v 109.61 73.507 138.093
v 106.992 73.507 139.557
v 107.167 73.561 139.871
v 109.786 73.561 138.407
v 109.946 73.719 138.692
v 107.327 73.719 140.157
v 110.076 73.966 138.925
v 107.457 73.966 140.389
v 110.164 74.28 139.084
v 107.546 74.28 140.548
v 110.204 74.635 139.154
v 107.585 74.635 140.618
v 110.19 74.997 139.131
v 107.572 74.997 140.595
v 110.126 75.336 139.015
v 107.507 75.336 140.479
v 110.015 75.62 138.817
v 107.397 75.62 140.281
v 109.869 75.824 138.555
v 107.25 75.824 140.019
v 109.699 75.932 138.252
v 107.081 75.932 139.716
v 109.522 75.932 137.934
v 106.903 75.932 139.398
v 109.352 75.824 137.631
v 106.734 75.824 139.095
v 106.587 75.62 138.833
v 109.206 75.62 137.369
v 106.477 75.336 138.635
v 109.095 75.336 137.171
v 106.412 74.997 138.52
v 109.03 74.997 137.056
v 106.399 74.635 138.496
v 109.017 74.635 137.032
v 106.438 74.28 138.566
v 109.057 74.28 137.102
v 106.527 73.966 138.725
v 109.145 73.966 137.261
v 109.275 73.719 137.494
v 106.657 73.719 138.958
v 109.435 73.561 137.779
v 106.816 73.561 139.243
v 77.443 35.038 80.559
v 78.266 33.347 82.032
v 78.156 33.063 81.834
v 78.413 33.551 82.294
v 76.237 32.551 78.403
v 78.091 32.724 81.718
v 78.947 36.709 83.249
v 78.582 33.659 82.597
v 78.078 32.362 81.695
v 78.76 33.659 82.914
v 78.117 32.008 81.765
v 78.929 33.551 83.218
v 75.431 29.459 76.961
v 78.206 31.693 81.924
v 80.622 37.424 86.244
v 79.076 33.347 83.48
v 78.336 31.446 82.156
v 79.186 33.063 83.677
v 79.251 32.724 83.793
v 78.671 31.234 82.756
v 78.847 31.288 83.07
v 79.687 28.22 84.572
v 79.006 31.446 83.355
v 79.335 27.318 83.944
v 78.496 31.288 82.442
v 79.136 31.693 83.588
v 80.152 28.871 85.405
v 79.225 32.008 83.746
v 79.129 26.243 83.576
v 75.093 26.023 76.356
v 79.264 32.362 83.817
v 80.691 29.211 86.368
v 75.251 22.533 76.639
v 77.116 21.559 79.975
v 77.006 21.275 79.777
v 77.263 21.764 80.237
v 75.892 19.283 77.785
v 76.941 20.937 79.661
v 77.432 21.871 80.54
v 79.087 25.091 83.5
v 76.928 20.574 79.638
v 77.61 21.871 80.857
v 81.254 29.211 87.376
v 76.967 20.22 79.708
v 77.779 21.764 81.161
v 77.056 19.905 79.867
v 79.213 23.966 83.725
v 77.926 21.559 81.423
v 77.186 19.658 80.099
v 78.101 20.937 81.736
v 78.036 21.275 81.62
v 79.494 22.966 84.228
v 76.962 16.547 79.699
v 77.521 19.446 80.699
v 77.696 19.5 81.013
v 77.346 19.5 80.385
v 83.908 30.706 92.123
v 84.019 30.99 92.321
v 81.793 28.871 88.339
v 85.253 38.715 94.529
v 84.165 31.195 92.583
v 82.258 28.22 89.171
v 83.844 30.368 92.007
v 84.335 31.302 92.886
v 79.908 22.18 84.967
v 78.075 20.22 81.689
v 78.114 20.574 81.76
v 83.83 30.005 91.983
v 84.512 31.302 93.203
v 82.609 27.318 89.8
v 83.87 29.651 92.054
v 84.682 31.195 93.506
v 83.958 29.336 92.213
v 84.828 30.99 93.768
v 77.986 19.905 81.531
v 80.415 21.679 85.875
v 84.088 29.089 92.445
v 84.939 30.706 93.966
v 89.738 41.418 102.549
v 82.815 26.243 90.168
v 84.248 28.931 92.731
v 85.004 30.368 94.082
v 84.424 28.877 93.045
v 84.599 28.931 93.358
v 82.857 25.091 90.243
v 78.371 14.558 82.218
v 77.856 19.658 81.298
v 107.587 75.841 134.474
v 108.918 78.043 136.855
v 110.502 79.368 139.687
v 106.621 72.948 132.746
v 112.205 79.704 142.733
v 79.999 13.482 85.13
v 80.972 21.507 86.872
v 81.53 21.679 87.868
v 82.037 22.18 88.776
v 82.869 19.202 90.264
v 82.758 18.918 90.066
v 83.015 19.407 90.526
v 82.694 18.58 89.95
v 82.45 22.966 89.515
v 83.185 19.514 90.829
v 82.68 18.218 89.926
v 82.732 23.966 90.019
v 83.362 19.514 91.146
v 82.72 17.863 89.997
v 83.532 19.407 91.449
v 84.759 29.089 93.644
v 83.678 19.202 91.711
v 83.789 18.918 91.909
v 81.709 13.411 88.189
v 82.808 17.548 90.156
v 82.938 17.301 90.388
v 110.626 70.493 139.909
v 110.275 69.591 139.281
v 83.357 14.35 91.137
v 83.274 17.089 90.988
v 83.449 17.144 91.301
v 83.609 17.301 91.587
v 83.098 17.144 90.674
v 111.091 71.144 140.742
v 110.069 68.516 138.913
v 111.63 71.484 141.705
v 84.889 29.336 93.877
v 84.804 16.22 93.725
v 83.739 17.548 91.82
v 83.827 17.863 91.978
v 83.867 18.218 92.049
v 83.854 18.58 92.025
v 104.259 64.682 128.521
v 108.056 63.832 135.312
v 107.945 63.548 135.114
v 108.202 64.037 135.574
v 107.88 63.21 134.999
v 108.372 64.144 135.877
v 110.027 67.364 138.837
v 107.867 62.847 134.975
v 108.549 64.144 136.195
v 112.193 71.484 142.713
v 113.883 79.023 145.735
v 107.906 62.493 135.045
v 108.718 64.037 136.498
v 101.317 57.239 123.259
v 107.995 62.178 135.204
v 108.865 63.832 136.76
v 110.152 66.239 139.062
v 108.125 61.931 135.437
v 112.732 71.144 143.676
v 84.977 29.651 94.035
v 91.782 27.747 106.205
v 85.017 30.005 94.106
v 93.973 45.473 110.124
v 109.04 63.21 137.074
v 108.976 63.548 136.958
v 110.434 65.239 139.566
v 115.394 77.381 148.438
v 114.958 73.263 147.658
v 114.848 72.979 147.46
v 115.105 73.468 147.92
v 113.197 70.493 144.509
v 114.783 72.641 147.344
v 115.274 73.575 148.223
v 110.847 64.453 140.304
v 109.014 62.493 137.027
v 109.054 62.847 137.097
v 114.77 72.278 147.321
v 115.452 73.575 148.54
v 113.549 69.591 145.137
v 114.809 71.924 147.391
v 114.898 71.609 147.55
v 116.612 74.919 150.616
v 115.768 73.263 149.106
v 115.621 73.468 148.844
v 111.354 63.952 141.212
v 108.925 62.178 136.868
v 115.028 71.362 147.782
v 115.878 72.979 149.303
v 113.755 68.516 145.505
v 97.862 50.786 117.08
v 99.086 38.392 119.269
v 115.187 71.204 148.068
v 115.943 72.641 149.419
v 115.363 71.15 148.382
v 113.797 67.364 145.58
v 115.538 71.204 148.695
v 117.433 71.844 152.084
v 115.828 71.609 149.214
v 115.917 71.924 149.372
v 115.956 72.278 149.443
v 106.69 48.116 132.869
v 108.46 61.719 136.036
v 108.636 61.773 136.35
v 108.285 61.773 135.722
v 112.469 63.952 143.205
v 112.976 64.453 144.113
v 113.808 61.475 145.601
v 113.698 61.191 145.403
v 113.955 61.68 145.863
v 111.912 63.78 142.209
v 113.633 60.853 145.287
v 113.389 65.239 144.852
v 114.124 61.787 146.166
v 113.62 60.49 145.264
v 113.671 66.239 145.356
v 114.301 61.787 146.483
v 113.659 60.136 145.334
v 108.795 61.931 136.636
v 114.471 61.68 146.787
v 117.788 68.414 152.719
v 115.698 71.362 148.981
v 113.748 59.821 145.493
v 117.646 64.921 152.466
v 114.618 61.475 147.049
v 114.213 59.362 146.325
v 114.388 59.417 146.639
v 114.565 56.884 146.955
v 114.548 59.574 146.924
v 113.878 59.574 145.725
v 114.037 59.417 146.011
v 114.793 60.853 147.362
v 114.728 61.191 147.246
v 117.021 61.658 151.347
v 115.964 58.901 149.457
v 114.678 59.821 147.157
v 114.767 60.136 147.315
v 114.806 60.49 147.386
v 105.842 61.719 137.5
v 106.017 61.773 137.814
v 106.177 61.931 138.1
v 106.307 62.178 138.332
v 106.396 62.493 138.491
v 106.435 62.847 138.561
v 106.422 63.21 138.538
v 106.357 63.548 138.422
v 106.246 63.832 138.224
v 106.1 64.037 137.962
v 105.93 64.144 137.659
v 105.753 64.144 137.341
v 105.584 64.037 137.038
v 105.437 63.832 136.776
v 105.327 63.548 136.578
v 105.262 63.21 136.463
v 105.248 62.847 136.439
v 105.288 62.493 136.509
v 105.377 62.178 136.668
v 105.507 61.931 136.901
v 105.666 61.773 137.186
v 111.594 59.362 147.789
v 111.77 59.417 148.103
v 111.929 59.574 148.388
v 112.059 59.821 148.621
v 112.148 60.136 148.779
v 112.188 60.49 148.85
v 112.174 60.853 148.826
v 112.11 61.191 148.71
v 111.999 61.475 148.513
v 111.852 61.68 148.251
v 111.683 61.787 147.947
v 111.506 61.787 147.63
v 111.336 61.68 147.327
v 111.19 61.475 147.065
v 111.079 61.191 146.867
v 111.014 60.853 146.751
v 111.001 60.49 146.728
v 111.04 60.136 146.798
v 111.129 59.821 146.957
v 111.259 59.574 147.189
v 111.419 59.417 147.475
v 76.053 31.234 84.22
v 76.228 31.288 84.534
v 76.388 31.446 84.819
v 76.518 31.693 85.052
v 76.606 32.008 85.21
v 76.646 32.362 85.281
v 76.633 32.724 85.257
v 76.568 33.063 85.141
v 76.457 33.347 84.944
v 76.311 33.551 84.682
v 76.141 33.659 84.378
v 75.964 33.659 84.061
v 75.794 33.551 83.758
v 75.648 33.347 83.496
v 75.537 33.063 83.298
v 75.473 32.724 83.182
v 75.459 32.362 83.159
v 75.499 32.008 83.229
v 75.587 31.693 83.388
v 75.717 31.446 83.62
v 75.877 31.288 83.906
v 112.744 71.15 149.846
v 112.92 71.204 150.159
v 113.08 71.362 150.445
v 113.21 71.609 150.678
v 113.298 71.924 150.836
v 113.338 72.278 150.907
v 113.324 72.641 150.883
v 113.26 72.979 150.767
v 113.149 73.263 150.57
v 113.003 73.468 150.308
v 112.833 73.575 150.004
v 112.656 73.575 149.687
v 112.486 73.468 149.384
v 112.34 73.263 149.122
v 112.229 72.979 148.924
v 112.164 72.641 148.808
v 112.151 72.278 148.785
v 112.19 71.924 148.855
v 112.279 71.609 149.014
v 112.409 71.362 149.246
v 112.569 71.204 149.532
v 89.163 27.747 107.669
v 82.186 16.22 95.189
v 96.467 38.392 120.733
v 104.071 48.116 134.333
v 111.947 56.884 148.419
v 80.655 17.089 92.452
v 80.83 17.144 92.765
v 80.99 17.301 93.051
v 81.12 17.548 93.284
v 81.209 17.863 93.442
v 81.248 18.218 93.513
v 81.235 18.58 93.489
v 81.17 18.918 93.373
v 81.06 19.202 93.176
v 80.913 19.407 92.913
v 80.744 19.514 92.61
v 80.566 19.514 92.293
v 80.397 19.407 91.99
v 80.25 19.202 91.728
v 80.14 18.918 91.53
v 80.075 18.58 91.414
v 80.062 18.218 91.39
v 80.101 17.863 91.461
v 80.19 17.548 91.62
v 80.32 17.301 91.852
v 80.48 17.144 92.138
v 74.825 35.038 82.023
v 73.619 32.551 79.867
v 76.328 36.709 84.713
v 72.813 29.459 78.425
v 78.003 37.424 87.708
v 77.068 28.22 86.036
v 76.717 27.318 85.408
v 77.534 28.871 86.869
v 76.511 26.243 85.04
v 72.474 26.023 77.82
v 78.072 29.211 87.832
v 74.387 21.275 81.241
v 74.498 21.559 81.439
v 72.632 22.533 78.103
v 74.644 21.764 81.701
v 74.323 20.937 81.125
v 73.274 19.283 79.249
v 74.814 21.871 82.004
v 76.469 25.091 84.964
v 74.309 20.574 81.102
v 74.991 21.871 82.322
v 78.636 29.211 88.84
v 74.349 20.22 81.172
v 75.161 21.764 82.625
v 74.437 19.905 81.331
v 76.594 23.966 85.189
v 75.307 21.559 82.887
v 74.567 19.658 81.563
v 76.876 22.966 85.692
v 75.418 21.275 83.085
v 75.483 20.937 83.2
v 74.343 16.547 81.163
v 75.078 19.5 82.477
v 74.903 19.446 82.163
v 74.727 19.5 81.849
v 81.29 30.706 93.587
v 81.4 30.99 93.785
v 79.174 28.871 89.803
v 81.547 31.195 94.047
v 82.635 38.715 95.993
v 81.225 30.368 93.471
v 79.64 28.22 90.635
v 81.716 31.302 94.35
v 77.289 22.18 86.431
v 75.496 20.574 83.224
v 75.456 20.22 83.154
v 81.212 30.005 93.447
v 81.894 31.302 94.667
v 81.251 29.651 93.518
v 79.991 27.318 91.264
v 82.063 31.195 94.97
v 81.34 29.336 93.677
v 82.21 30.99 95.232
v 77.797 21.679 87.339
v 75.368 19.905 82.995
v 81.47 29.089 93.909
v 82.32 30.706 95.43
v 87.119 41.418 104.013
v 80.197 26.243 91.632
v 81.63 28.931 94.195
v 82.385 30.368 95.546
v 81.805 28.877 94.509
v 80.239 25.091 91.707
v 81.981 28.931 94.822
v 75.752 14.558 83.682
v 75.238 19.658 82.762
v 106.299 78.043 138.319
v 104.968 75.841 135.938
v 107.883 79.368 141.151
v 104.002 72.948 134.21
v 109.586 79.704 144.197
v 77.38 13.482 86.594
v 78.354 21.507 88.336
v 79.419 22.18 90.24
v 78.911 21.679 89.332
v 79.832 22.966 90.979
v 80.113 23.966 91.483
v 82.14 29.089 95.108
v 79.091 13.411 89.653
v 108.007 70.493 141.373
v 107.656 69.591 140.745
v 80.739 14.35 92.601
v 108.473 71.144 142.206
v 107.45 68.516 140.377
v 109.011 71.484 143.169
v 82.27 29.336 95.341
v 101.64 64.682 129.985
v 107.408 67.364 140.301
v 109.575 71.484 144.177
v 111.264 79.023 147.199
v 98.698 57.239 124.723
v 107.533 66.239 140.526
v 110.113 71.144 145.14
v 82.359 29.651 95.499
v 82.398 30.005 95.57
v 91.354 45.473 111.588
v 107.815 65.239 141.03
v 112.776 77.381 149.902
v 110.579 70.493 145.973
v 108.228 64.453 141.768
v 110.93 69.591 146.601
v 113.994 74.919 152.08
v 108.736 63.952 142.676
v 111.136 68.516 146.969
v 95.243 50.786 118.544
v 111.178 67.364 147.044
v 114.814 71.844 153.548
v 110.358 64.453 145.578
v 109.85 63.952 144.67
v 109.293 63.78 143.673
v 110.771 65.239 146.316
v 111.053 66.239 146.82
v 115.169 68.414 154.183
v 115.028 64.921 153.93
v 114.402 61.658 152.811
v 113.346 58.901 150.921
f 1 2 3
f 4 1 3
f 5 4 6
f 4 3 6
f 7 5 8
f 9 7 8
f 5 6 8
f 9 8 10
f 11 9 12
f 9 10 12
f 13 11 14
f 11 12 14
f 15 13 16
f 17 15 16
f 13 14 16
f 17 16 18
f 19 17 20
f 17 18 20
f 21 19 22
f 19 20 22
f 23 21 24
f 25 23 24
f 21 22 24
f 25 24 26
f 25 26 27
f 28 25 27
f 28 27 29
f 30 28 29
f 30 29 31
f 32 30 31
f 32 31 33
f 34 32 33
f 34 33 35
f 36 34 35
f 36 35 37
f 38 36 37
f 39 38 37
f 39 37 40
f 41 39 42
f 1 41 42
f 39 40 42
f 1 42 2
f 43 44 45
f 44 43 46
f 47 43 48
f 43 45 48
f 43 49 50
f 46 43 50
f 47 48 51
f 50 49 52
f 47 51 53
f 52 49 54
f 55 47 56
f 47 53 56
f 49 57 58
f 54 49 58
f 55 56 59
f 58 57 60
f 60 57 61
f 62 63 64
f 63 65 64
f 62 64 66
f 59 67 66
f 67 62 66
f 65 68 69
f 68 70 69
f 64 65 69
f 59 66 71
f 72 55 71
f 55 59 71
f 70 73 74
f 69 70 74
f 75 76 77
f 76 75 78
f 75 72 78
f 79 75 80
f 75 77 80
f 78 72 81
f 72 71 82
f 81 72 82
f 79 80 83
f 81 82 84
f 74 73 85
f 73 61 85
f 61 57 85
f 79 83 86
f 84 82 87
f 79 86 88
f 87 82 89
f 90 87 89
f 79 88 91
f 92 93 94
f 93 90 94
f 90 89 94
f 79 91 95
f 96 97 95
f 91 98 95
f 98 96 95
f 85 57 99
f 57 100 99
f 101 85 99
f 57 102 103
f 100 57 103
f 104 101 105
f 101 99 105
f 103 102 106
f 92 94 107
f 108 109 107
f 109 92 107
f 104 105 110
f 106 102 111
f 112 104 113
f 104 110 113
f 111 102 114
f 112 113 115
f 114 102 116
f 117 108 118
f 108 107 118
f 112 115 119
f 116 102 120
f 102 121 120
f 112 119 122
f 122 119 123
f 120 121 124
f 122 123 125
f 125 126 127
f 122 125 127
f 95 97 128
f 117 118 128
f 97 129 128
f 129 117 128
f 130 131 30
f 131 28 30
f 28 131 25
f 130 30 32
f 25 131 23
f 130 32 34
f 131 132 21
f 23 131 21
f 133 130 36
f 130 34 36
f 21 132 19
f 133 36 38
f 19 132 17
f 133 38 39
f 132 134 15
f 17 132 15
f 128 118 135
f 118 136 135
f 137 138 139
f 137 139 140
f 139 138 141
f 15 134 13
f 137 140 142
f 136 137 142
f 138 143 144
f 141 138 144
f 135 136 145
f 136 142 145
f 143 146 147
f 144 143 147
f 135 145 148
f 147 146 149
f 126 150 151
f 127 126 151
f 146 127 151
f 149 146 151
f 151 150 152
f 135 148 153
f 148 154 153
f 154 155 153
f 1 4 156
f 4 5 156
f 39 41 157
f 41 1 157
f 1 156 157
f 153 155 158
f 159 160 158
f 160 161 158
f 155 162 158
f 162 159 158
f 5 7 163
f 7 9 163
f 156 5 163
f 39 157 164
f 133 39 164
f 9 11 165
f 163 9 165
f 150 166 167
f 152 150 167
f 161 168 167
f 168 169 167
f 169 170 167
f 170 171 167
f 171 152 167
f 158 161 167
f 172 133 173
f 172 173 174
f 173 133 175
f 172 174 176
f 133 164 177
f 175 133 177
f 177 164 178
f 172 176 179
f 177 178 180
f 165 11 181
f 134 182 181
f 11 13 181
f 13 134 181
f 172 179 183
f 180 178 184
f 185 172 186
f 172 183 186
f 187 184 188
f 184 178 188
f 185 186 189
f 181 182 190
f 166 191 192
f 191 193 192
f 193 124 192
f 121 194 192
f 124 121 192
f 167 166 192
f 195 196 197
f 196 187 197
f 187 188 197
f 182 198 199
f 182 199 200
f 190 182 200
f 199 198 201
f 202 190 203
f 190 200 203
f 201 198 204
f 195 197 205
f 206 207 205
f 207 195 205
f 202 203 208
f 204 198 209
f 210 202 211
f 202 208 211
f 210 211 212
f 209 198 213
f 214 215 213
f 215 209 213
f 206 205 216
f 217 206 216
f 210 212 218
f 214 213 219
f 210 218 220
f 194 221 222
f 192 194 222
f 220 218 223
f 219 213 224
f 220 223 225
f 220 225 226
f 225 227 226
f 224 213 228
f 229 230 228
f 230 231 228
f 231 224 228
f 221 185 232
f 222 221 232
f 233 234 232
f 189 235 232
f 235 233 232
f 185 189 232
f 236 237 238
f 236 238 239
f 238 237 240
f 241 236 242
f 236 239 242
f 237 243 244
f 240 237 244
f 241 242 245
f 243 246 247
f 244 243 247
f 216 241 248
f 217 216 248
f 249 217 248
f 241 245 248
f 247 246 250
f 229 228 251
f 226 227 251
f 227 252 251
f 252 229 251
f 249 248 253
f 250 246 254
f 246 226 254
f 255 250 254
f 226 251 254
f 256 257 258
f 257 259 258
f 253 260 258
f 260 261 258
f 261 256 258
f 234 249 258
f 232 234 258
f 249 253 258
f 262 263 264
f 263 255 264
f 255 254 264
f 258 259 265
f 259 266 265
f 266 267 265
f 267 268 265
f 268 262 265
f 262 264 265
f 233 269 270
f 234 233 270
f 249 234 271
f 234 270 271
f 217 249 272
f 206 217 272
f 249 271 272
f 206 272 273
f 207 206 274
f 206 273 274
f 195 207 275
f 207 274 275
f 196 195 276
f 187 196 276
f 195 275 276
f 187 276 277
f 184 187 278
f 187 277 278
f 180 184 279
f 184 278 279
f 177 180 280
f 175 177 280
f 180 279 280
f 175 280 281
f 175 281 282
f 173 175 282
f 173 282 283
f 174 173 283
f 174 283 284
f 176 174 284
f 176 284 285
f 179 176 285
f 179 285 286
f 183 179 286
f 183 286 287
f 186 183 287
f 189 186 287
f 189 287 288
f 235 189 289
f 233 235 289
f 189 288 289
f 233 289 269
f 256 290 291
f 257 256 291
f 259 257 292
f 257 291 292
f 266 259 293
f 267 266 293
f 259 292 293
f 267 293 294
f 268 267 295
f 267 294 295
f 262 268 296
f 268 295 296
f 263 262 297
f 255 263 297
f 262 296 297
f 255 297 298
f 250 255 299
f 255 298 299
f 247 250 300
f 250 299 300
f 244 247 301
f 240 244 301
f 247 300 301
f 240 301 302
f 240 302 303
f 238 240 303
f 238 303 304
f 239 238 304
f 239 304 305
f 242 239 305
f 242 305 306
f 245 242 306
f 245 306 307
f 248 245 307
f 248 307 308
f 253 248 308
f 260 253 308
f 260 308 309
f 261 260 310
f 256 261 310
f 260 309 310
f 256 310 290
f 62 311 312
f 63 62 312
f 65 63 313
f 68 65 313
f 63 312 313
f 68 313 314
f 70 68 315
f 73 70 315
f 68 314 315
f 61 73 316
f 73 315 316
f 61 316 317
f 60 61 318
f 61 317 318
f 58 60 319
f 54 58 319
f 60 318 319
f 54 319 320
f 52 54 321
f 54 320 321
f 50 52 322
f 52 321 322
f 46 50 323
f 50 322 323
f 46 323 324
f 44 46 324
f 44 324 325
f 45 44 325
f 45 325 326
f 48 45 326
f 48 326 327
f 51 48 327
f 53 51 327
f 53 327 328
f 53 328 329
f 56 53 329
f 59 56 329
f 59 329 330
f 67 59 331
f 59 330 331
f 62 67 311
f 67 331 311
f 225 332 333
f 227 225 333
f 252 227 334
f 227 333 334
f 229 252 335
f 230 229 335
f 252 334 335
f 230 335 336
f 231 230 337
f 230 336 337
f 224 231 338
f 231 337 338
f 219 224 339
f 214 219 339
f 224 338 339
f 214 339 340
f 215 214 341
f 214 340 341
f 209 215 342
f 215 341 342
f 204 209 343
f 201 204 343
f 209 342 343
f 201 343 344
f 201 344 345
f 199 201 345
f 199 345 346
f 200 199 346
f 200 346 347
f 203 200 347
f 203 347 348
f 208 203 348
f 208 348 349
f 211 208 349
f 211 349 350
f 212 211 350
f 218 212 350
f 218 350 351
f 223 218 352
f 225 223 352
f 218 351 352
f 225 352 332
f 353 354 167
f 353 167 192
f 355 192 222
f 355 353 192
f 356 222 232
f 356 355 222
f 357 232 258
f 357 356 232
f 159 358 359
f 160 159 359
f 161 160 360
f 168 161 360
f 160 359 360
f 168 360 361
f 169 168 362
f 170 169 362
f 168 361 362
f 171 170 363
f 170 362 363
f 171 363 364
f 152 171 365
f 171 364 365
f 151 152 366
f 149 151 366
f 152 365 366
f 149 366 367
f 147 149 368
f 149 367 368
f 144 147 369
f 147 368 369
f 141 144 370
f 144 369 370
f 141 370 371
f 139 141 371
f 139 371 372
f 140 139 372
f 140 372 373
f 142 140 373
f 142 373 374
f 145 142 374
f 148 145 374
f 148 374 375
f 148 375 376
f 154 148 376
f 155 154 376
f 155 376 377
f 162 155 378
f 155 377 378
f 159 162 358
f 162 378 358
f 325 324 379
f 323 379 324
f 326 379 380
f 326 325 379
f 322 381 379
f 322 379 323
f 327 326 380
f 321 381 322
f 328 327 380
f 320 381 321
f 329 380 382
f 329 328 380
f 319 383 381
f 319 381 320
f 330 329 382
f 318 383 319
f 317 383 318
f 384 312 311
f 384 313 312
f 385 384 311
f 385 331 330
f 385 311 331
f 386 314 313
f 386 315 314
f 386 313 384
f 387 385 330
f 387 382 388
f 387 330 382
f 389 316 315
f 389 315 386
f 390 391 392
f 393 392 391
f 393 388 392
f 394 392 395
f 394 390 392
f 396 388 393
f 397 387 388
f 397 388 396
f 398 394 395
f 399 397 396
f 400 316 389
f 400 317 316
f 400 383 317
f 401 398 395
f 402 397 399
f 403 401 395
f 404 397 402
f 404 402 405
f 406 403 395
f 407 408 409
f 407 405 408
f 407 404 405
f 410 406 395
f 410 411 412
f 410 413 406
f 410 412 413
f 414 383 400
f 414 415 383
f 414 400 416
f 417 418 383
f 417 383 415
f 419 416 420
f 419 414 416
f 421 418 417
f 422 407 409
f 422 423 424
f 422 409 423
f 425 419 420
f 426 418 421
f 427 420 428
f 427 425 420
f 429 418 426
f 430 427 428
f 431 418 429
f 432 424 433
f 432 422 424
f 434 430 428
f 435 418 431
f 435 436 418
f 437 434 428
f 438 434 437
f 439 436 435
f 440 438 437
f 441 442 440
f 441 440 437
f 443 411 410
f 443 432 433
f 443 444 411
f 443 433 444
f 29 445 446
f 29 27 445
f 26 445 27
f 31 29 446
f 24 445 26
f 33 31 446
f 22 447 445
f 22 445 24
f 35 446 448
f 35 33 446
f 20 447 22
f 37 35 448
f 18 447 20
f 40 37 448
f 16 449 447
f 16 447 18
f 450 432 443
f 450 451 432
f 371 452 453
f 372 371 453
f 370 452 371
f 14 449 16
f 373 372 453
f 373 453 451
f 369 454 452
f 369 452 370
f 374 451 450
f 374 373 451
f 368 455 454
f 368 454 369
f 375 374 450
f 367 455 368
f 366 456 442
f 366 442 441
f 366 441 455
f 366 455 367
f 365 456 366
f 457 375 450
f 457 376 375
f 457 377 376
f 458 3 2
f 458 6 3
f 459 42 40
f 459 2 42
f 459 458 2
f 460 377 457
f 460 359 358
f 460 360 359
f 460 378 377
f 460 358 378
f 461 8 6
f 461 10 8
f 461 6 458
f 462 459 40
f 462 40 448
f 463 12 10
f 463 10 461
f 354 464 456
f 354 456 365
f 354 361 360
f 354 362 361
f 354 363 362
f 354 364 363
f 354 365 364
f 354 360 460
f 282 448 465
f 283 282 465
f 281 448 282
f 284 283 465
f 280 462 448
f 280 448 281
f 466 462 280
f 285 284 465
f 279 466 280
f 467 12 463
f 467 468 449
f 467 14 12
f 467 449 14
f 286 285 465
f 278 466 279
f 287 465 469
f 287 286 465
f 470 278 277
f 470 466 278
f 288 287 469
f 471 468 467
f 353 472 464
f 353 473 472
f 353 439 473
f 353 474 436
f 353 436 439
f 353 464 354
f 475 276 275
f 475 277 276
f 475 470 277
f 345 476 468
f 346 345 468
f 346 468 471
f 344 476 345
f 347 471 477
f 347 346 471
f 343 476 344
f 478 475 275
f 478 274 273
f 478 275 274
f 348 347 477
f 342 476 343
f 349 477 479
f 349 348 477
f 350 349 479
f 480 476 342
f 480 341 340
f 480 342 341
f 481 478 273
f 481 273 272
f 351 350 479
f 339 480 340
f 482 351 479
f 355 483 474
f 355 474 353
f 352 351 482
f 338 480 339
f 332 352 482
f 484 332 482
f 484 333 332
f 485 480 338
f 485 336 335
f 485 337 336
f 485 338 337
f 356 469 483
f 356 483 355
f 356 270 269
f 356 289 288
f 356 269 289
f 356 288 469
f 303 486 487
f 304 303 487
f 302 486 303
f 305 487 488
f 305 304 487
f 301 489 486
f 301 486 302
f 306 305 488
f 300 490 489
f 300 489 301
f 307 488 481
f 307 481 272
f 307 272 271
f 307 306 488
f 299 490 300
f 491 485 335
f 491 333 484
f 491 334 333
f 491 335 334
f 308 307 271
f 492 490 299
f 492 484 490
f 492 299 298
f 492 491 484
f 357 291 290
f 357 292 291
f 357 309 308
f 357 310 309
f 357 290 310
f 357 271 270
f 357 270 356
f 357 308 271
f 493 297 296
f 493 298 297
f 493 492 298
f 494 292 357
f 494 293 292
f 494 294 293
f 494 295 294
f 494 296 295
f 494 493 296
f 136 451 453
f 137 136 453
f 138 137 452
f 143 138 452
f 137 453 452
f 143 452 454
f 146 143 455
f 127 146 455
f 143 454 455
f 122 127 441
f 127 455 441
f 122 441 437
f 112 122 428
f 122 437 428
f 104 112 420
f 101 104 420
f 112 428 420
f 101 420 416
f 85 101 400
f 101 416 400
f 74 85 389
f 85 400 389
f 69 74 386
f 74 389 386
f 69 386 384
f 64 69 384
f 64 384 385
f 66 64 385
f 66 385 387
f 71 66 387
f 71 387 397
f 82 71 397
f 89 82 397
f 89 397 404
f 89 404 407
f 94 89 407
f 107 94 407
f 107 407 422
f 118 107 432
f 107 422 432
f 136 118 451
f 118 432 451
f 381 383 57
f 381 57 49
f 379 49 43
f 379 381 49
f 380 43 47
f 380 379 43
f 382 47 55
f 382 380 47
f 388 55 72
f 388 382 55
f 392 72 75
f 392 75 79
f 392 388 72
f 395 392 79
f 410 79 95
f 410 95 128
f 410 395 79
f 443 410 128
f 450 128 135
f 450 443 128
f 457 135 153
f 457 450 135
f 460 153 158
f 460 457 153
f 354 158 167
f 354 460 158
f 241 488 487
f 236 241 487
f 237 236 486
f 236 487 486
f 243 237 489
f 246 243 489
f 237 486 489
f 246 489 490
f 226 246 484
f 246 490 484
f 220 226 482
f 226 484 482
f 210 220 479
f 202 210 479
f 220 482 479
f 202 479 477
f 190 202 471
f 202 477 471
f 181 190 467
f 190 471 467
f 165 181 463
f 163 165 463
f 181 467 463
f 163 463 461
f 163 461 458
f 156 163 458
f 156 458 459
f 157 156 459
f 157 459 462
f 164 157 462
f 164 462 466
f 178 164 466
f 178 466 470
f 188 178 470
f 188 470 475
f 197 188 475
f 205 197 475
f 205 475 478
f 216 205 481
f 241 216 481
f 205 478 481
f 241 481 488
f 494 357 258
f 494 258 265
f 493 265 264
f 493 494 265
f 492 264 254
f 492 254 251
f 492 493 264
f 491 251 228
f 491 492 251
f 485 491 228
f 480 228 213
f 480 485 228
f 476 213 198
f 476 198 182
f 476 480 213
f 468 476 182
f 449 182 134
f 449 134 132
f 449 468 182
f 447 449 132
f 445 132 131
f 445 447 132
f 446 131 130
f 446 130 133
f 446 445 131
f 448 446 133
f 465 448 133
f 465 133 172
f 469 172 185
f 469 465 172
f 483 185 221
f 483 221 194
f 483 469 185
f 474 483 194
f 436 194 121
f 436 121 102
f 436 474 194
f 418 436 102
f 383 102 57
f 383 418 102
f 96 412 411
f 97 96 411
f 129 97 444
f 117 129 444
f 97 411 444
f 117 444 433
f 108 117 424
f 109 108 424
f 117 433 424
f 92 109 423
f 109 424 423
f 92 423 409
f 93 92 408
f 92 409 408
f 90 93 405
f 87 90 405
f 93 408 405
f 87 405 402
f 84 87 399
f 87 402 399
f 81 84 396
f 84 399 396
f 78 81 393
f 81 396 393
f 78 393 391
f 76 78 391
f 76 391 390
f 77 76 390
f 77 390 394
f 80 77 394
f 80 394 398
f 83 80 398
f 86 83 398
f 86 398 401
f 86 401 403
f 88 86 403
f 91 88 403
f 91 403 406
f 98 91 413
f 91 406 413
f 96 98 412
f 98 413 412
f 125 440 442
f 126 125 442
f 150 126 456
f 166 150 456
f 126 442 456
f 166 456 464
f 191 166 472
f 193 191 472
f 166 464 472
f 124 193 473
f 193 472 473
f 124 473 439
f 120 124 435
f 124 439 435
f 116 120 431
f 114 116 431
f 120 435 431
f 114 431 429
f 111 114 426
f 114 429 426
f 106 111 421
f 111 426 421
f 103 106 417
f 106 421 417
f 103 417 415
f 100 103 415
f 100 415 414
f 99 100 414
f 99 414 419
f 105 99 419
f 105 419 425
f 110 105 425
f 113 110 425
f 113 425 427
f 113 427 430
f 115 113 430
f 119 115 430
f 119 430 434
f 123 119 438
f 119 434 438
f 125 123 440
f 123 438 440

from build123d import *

# Parameters (mm, degrees)
SKETCH1_R           = 1.2192
SKETCH1_R_2         = 3.8735
BOSS_EXTRUDE1_DEPTH = 3


with BuildPart() as part:
    # Sketch1 → Boss-Extrude1 (new body)
    with BuildSketch(Plane(origin=(22.066943297, 0, -12.337708943), x_dir=(0, -1, 0), z_dir=(-0.872839337, 0, 0.488007675))):
        with BuildLine():
            ThreePointArc((-72.947857894, 167.897835008), (-47.979019161, 146.065099757), (-37.424383054, 114.621326243))
            ThreePointArc((-37.424383054, 114.621326243), (-20.859592098, 104.154397101), (-16.22026224, 123.191873917))
            ThreePointArc((-16.22026224, 123.191873917), (-38.39182686, 152.45760543), (-56.883606586, 184.176927637))
            ThreePointArc((-56.883606586, 184.176927637), (-76.241477877, 187.213656824), (-72.947857894, 167.897835008))
        make_face()
        with Locations((-32.452983518, 110.624678087)):
            Circle(SKETCH1_R, mode=Mode.SUBTRACT)
        with Locations((-20.665274094, 108.268060476)):
            Circle(SKETCH1_R, mode=Mode.SUBTRACT)
        with Locations((-18.308656482, 120.055769899)):
            Circle(SKETCH1_R, mode=Mode.SUBTRACT)
        with Locations((-30.096365906, 122.412387511)):
            Circle(SKETCH1_R, mode=Mode.SUBTRACT)
        with Locations((-62.938209154, 171.667105905)):
            Circle(SKETCH1_R, mode=Mode.SUBTRACT)
        with Locations((-60.581591542, 183.454815329)):
            Circle(SKETCH1_R, mode=Mode.SUBTRACT)
        with Locations((-72.369300966, 185.811432941)):
            Circle(SKETCH1_R, mode=Mode.SUBTRACT)
        with Locations((-74.725918578, 174.023723517)):
            Circle(SKETCH1_R, mode=Mode.SUBTRACT)
        with Locations((-67.65375506, 178.739269423)):
            Circle(SKETCH1_R_2, mode=Mode.SUBTRACT)
        with Locations((-25.38082, 115.340223993)):
            Circle(SKETCH1_R_2, mode=Mode.SUBTRACT)
    extrude(amount=-BOSS_EXTRUDE1_DEPTH)


solid = part.part
